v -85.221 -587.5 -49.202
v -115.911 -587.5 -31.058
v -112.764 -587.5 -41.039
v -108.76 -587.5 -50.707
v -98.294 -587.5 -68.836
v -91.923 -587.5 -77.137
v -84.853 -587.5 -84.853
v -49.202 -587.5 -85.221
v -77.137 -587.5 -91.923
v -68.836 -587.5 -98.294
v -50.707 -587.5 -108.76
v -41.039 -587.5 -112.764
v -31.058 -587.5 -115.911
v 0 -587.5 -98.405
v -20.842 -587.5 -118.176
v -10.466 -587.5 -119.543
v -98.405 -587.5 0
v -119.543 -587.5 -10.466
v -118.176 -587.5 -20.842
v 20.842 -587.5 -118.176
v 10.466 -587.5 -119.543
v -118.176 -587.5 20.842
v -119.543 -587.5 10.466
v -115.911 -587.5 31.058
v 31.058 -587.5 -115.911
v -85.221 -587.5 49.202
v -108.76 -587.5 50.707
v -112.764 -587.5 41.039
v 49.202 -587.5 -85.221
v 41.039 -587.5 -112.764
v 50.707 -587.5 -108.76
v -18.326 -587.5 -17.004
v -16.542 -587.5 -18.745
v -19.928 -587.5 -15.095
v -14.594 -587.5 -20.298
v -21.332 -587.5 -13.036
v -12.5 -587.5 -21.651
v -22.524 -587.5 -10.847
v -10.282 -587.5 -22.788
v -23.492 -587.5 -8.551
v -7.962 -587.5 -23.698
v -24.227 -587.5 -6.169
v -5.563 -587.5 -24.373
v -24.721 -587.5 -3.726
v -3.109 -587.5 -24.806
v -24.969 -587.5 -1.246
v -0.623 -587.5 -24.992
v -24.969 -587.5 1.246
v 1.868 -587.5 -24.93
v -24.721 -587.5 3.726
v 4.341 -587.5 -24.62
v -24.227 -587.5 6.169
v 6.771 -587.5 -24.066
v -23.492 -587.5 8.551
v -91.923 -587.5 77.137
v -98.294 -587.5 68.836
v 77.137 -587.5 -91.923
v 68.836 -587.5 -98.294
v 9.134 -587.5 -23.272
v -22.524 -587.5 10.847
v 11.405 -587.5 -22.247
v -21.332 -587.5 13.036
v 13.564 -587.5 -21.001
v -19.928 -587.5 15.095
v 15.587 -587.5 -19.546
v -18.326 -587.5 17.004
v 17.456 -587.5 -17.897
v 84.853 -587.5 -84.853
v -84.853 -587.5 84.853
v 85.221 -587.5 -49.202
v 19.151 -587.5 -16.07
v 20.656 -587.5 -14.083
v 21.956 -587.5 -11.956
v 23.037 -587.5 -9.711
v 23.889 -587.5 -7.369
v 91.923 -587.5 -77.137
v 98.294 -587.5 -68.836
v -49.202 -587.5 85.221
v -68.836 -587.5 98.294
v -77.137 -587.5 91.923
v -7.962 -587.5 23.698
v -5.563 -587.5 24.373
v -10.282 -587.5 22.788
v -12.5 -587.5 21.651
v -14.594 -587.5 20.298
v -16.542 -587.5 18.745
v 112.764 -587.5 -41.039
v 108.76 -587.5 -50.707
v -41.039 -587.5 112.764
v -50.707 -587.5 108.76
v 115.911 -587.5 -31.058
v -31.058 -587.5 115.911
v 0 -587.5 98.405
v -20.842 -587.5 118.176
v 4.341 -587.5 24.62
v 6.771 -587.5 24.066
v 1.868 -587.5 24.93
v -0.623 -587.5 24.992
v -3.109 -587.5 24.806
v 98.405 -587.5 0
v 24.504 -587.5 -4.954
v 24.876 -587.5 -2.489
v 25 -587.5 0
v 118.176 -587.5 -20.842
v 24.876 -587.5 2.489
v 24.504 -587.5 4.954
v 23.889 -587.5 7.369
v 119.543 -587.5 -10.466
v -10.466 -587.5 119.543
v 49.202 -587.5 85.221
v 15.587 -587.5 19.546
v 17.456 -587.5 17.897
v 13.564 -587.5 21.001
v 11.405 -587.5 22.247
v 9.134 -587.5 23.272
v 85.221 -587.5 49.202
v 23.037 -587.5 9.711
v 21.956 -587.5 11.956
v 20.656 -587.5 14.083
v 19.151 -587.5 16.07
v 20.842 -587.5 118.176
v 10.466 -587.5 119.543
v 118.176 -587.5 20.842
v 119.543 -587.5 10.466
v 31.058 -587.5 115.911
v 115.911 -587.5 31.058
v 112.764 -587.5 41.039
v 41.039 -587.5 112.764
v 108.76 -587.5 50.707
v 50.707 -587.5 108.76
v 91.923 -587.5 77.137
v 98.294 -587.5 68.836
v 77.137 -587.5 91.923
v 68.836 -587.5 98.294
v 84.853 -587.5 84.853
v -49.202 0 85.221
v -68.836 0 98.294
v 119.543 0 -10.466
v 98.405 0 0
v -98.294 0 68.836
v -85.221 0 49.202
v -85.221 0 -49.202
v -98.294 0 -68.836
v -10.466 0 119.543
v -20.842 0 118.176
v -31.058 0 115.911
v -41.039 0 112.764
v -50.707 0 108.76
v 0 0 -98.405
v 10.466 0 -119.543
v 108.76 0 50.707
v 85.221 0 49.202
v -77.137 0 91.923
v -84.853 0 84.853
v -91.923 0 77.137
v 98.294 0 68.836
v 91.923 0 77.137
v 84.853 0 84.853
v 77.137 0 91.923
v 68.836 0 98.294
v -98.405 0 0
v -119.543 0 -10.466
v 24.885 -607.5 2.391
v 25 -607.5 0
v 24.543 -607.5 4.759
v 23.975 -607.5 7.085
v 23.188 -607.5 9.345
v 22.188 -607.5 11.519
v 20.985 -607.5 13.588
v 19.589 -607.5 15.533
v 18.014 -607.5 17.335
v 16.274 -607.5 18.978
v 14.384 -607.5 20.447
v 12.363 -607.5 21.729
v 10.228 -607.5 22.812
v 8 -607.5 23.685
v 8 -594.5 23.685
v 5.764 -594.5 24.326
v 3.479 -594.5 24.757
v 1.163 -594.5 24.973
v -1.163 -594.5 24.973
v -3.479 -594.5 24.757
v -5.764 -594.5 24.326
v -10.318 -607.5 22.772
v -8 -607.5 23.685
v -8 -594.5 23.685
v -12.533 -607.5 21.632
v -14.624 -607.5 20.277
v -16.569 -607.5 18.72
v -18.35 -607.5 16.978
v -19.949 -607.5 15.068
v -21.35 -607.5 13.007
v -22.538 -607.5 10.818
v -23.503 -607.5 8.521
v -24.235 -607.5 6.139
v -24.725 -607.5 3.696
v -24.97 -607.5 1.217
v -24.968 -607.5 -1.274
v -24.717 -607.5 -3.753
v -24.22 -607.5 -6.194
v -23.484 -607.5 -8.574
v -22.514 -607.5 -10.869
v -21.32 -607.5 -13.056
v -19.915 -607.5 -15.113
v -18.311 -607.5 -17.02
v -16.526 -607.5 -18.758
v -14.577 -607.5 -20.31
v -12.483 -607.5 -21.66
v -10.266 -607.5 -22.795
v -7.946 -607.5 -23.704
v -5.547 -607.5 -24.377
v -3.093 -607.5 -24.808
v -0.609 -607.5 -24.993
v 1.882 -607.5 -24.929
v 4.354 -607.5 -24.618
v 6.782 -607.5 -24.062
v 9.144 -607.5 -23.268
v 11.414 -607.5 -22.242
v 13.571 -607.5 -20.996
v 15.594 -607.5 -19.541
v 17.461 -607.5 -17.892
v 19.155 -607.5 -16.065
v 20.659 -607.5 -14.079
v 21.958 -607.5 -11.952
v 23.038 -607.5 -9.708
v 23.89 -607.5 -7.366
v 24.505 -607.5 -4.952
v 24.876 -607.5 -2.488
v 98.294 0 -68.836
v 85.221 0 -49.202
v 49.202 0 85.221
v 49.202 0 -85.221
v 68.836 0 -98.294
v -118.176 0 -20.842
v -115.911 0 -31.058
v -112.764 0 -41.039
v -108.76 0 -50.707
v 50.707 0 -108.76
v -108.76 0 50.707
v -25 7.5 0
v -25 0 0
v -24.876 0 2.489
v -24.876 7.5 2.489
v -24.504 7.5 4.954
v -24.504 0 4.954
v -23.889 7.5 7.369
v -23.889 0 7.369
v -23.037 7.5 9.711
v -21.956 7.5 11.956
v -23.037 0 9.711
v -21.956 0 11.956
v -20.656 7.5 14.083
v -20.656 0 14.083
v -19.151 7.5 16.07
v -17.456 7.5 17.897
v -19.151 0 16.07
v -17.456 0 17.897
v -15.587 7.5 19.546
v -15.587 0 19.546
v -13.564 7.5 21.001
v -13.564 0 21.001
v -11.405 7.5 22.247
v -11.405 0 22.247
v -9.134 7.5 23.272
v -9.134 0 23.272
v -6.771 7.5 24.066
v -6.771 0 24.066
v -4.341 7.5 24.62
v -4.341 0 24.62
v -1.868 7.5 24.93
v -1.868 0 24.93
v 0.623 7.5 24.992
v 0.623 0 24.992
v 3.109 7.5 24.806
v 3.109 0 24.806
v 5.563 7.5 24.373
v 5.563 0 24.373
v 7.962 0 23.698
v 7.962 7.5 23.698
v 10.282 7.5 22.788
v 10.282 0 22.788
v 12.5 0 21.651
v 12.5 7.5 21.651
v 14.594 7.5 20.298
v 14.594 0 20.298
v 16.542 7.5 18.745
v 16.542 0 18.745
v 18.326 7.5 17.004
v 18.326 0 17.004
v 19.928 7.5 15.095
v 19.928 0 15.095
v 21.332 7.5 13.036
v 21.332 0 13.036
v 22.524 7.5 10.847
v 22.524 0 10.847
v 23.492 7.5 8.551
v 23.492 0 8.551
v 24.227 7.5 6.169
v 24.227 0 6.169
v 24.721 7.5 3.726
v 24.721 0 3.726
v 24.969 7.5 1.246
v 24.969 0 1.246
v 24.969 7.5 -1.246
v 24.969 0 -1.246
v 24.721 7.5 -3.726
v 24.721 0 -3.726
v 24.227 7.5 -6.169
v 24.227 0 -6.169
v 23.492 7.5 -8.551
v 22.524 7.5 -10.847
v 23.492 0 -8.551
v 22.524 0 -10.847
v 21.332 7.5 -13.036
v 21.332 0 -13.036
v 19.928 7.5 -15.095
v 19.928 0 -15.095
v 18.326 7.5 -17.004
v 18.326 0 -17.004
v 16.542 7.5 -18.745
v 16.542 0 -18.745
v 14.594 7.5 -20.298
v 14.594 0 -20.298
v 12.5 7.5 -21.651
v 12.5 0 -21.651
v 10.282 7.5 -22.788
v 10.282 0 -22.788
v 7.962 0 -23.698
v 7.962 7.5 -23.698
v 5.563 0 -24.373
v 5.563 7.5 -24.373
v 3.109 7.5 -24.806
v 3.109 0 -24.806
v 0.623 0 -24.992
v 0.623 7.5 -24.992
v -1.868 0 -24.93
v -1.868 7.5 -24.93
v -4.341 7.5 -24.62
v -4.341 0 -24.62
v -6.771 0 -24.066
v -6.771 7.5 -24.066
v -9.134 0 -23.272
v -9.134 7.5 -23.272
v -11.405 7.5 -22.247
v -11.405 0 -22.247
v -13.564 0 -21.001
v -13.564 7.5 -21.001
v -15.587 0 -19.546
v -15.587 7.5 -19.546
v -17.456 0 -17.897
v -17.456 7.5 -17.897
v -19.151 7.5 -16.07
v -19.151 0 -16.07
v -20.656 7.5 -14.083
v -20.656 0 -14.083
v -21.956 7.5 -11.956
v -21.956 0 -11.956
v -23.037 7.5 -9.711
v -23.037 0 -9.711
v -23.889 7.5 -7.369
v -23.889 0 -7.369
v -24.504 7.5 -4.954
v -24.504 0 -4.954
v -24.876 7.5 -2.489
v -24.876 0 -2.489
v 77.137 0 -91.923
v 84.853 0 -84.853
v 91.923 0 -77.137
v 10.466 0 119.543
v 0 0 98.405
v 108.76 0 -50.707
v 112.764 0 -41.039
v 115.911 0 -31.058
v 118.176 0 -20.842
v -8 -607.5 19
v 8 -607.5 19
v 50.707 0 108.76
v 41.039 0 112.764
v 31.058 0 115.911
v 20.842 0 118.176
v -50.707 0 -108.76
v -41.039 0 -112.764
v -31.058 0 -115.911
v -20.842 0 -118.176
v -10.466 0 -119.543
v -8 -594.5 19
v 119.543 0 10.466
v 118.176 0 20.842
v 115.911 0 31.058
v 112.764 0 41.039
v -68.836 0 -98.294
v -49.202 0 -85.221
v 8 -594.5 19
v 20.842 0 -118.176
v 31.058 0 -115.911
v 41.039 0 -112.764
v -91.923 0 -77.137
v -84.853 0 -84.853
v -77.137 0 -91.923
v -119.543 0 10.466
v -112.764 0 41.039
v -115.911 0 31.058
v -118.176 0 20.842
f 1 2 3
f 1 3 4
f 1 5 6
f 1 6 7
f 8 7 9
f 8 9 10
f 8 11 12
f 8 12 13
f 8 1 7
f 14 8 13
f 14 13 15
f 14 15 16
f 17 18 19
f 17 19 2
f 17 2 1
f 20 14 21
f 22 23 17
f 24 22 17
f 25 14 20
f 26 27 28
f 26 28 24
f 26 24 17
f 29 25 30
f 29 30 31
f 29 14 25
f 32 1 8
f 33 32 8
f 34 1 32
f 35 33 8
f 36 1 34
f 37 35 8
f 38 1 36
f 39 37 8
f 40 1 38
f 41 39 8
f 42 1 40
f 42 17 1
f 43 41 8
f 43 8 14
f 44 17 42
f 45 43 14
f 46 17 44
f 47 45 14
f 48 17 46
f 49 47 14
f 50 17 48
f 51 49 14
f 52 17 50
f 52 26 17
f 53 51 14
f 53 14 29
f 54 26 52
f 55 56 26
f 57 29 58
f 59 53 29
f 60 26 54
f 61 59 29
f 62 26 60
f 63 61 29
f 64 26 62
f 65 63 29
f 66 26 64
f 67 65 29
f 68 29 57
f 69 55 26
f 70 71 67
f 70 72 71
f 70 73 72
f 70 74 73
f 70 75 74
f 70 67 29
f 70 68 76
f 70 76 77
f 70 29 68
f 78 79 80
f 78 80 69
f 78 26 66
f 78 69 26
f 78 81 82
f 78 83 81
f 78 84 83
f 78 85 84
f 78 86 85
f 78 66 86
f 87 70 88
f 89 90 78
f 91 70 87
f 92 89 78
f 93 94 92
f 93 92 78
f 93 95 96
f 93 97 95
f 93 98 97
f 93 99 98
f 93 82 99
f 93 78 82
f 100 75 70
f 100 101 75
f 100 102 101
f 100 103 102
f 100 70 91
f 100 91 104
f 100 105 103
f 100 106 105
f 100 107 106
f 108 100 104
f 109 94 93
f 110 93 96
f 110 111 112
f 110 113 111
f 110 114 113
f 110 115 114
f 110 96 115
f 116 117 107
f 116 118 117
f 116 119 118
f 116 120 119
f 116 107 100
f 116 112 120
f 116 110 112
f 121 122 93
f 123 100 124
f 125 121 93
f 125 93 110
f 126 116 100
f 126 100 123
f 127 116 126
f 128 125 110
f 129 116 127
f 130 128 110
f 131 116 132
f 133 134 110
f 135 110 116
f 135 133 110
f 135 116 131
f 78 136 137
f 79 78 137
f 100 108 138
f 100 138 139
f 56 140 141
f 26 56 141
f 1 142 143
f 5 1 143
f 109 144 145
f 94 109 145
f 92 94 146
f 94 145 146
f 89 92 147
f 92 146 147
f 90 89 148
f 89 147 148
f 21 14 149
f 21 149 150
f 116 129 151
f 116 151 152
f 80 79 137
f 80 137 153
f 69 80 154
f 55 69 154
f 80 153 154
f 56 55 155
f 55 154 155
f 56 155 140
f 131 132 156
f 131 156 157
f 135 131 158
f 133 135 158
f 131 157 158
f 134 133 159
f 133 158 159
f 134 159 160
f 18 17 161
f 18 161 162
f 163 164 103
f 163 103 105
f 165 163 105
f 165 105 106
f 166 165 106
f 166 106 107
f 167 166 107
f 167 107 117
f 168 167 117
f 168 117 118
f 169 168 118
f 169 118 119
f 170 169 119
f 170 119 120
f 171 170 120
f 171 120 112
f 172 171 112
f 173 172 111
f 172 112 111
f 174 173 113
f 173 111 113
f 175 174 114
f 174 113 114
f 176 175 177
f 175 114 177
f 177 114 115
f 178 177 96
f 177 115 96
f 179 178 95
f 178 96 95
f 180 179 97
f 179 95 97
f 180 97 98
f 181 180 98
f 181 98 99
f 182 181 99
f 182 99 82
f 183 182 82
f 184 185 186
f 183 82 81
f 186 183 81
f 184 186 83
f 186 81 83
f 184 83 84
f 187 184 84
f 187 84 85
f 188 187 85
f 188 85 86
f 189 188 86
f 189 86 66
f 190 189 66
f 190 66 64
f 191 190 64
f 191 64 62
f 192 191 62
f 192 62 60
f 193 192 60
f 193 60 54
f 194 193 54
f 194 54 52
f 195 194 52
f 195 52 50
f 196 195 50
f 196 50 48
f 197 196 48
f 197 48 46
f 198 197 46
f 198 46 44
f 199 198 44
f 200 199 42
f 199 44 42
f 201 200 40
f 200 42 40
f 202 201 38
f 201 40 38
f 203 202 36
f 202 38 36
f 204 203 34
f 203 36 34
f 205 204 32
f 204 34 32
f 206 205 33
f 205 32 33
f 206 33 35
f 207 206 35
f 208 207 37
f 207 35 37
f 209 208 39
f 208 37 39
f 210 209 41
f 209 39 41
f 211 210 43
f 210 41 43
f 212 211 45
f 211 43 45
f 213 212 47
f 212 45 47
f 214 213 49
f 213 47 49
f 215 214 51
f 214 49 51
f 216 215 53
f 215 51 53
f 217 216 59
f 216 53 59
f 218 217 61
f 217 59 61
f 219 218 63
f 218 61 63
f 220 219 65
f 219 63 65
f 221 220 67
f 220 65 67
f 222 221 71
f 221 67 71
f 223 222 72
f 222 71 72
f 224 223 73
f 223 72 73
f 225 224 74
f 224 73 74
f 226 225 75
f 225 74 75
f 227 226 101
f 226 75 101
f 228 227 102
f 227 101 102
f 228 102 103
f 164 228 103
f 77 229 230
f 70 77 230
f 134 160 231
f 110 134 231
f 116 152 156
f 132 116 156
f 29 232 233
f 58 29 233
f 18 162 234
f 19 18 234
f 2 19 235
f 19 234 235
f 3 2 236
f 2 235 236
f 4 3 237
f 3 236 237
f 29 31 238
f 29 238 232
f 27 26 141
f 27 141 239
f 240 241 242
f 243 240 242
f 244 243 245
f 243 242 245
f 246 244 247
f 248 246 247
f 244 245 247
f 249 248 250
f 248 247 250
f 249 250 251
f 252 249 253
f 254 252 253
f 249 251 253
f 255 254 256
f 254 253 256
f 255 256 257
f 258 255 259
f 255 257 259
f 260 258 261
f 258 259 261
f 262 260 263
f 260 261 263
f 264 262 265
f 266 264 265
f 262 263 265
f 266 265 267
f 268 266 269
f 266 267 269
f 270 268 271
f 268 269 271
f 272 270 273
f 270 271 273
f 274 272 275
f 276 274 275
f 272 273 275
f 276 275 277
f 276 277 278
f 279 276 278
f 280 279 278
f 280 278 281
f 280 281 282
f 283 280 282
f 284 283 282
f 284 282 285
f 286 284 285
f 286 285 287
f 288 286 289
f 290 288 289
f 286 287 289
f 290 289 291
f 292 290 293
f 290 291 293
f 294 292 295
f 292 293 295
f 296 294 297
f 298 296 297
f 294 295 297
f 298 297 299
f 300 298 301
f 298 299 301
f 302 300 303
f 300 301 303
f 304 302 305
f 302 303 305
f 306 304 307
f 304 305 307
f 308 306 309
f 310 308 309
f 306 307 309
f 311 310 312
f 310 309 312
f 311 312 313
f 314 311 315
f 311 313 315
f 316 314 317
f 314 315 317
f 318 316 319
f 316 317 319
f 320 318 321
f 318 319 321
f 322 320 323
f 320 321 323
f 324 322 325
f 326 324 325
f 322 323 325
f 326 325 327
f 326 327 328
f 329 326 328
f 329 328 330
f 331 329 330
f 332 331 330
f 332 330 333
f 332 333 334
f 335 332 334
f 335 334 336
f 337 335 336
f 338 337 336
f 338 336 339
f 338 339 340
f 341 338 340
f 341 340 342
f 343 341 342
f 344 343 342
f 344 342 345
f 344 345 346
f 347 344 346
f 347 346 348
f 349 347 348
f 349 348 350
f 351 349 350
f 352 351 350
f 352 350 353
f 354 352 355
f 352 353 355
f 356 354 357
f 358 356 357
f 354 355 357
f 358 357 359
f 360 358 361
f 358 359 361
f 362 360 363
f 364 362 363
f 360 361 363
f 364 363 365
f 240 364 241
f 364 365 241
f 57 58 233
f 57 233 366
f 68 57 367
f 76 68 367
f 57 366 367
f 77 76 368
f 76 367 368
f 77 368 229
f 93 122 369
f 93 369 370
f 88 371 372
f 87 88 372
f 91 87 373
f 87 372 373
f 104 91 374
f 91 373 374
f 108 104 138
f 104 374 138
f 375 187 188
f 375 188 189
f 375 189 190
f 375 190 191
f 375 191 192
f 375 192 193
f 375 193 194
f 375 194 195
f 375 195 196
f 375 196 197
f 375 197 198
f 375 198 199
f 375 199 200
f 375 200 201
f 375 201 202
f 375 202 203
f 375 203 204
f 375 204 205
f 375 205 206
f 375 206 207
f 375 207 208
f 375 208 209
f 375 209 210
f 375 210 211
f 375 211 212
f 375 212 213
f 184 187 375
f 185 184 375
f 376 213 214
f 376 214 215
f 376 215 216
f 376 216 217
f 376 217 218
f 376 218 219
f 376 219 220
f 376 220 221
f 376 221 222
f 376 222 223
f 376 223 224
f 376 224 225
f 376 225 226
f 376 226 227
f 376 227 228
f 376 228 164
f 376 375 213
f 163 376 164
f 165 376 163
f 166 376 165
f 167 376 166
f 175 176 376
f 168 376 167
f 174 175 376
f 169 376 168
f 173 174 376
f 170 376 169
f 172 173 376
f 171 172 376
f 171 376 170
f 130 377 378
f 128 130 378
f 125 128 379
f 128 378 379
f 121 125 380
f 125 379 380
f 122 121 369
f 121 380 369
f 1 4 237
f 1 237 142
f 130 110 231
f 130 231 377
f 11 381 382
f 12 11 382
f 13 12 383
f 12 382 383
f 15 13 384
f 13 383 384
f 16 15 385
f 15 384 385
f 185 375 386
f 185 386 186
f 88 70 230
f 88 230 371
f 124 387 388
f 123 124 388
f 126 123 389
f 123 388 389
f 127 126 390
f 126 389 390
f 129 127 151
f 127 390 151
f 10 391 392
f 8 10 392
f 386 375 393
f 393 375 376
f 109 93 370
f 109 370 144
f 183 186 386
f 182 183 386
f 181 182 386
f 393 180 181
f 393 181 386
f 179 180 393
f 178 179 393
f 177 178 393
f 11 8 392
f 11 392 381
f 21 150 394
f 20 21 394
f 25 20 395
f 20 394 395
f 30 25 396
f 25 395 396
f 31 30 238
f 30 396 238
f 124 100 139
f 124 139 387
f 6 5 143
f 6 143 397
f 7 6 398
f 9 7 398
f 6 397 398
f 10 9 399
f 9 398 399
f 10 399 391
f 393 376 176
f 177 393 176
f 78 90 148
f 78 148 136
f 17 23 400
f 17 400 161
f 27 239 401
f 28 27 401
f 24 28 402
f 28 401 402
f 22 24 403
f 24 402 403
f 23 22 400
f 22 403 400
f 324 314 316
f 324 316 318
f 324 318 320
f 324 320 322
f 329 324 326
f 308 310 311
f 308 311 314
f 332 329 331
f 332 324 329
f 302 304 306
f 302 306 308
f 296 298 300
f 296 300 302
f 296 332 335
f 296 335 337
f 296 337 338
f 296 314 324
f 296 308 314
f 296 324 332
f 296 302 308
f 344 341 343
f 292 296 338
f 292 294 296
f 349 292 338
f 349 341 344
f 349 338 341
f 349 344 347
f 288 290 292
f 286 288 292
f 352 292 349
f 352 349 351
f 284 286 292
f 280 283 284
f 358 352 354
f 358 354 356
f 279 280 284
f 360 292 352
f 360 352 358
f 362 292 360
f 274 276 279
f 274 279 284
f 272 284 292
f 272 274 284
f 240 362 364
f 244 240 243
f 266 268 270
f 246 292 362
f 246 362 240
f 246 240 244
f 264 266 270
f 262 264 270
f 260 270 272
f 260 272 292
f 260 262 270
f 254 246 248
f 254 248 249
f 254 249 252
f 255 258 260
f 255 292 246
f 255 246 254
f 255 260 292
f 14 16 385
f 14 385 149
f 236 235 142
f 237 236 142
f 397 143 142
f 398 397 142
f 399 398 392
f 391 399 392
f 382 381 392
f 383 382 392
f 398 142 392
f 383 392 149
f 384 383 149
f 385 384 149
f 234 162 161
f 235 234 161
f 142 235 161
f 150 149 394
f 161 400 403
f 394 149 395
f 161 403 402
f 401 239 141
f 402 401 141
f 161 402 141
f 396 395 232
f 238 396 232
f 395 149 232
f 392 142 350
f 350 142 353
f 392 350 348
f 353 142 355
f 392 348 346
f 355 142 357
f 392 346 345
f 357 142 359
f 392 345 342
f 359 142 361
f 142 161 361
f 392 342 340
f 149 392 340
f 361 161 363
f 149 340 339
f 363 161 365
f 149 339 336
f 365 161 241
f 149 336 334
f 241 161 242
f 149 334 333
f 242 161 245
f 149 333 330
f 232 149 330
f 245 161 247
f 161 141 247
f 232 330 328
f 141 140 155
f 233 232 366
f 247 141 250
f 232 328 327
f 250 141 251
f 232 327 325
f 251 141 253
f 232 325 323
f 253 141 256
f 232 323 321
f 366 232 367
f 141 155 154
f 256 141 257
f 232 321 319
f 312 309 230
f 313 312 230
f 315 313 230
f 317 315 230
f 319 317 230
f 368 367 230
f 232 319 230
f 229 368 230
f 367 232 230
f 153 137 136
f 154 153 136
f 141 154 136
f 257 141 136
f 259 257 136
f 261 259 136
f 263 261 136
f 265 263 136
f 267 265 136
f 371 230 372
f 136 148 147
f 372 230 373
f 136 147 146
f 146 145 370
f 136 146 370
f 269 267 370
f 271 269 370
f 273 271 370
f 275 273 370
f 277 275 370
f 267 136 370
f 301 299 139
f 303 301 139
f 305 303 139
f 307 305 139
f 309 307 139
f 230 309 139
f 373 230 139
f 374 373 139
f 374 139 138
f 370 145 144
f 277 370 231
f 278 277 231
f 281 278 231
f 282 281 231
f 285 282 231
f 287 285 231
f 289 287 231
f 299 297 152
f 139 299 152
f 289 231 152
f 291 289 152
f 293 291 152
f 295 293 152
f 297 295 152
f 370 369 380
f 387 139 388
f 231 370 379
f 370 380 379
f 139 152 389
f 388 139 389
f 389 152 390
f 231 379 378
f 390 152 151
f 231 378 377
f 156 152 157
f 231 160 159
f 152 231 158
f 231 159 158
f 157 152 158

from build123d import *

# Parameters (mm, degrees)
F1_DEPTH = 587.5
F2_R     = 25
F3_DEPTH = 7.5
F4_R     = 25
F5_DEPTH = 20
F6_W     = 16
F6_H     = 7.0096296601
F7_DEPTH = 13


with BuildPart() as f1:
    # F0 (on Front) → F1 (new body)
    with BuildSketch(Plane.XZ):
        with BuildLine():
            Line((98.404571414, 0), (119.5426846988, 10.4664480605))
            ThreePointArc((119.5426846988, 10.4664480605), (115.9110991547, 31.0582854123), (108.760225816, 50.7071324417))
            Line((108.760225816, 50.7071324417), (85.220858693, 49.202285707))
            Line((85.220858693, 49.202285707), (98.2937777555, 68.8355522572))
            ThreePointArc((98.2937777555, 68.8355522572), (84.8528137424, 84.8528137424), (68.8355522572, 98.2937777555))
            Line((68.8355522572, 98.2937777555), (49.202285707, 85.220858693))
            Line((49.202285707, 85.220858693), (50.7071324417, 108.760225816))
            ThreePointArc((50.7071324417, 108.760225816), (31.0582854123, 115.9110991547), (10.4664480605, 119.5426846988))
            Line((10.4664480605, 119.5426846988), (0, 98.404571414))
            Line((0, 98.404571414), (-10.4664480605, 119.5426846988))
            ThreePointArc((-10.4664480605, 119.5426846988), (-31.0582854123, 115.9110991547), (-50.7071324417, 108.760225816))
            Line((-50.7071324417, 108.760225816), (-49.202285707, 85.220858693))
            Line((-49.202285707, 85.220858693), (-68.8355522572, 98.2937777555))
            ThreePointArc((-68.8355522572, 98.2937777555), (-84.8528137424, 84.8528137424), (-98.2937777555, 68.8355522572))
            Line((-98.2937777555, 68.8355522572), (-85.220858693, 49.202285707))
            Line((-85.220858693, 49.202285707), (-108.760225816, 50.7071324417))
            ThreePointArc((-108.760225816, 50.7071324417), (-115.9110991547, 31.0582854123), (-119.5426846988, 10.4664480605))
            Line((-119.5426846988, 10.4664480605), (-98.404571414, 0))
            Line((-98.404571414, 0), (-119.5426846988, -10.4664480605))
            ThreePointArc((-119.5426846988, -10.4664480605), (-115.9110991547, -31.0582854123), (-108.760225816, -50.7071324417))
            Line((-108.760225816, -50.7071324417), (-85.220858693, -49.202285707))
            Line((-85.220858693, -49.202285707), (-98.2937777555, -68.8355522572))
            ThreePointArc((-98.2937777555, -68.8355522572), (-84.8528137424, -84.8528137424), (-68.8355522572, -98.2937777555))
            Line((-68.8355522572, -98.2937777555), (-49.202285707, -85.220858693))
            Line((-49.202285707, -85.220858693), (-50.7071324417, -108.760225816))
            ThreePointArc((-50.7071324417, -108.760225816), (-31.0582854123, -115.9110991547), (-10.4664480605, -119.5426846988))
            Line((-10.4664480605, -119.5426846988), (0, -98.404571414))
            Line((0, -98.404571414), (10.4664480605, -119.5426846988))
            ThreePointArc((10.4664480605, -119.5426846988), (31.0582854123, -115.9110991547), (50.7071324417, -108.760225816))
            Line((50.7071324417, -108.760225816), (49.202285707, -85.220858693))
            Line((49.202285707, -85.220858693), (68.8355522572, -98.2937777555))
            ThreePointArc((68.8355522572, -98.2937777555), (84.8528137424, -84.8528137424), (98.2937777555, -68.8355522572))
            Line((98.2937777555, -68.8355522572), (85.220858693, -49.202285707))
            Line((85.220858693, -49.202285707), (108.760225816, -50.7071324417))
            ThreePointArc((108.760225816, -50.7071324417), (115.9110991547, -31.0582854123), (119.5426846988, -10.4664480605))
            Line((119.5426846988, -10.4664480605), (98.404571414, 0))
        make_face()
    extrude(amount=F1_DEPTH)

    # F2 (on face) → F3 (join)
    with BuildSketch(Plane(origin=(0, 0, 0), x_dir=(-1, 0, 0), z_dir=(0, 1, 0))):
        Circle(F2_R)
    extrude(amount=F3_DEPTH)

    # F4 (on face) → F5 (join)
    with BuildSketch(Plane.XZ.offset(587.5)):
        Circle(F4_R)
    extrude(amount=F5_DEPTH)

    # F6 (on face) → F7 (cut)
    with BuildSketch(Plane.XZ.offset(607.5)):
        with Locations((0, 22.50481483)):
            Rectangle(F6_W, F6_H)
    extrude(amount=-F7_DEPTH, mode=Mode.SUBTRACT)


solid = f1.part
